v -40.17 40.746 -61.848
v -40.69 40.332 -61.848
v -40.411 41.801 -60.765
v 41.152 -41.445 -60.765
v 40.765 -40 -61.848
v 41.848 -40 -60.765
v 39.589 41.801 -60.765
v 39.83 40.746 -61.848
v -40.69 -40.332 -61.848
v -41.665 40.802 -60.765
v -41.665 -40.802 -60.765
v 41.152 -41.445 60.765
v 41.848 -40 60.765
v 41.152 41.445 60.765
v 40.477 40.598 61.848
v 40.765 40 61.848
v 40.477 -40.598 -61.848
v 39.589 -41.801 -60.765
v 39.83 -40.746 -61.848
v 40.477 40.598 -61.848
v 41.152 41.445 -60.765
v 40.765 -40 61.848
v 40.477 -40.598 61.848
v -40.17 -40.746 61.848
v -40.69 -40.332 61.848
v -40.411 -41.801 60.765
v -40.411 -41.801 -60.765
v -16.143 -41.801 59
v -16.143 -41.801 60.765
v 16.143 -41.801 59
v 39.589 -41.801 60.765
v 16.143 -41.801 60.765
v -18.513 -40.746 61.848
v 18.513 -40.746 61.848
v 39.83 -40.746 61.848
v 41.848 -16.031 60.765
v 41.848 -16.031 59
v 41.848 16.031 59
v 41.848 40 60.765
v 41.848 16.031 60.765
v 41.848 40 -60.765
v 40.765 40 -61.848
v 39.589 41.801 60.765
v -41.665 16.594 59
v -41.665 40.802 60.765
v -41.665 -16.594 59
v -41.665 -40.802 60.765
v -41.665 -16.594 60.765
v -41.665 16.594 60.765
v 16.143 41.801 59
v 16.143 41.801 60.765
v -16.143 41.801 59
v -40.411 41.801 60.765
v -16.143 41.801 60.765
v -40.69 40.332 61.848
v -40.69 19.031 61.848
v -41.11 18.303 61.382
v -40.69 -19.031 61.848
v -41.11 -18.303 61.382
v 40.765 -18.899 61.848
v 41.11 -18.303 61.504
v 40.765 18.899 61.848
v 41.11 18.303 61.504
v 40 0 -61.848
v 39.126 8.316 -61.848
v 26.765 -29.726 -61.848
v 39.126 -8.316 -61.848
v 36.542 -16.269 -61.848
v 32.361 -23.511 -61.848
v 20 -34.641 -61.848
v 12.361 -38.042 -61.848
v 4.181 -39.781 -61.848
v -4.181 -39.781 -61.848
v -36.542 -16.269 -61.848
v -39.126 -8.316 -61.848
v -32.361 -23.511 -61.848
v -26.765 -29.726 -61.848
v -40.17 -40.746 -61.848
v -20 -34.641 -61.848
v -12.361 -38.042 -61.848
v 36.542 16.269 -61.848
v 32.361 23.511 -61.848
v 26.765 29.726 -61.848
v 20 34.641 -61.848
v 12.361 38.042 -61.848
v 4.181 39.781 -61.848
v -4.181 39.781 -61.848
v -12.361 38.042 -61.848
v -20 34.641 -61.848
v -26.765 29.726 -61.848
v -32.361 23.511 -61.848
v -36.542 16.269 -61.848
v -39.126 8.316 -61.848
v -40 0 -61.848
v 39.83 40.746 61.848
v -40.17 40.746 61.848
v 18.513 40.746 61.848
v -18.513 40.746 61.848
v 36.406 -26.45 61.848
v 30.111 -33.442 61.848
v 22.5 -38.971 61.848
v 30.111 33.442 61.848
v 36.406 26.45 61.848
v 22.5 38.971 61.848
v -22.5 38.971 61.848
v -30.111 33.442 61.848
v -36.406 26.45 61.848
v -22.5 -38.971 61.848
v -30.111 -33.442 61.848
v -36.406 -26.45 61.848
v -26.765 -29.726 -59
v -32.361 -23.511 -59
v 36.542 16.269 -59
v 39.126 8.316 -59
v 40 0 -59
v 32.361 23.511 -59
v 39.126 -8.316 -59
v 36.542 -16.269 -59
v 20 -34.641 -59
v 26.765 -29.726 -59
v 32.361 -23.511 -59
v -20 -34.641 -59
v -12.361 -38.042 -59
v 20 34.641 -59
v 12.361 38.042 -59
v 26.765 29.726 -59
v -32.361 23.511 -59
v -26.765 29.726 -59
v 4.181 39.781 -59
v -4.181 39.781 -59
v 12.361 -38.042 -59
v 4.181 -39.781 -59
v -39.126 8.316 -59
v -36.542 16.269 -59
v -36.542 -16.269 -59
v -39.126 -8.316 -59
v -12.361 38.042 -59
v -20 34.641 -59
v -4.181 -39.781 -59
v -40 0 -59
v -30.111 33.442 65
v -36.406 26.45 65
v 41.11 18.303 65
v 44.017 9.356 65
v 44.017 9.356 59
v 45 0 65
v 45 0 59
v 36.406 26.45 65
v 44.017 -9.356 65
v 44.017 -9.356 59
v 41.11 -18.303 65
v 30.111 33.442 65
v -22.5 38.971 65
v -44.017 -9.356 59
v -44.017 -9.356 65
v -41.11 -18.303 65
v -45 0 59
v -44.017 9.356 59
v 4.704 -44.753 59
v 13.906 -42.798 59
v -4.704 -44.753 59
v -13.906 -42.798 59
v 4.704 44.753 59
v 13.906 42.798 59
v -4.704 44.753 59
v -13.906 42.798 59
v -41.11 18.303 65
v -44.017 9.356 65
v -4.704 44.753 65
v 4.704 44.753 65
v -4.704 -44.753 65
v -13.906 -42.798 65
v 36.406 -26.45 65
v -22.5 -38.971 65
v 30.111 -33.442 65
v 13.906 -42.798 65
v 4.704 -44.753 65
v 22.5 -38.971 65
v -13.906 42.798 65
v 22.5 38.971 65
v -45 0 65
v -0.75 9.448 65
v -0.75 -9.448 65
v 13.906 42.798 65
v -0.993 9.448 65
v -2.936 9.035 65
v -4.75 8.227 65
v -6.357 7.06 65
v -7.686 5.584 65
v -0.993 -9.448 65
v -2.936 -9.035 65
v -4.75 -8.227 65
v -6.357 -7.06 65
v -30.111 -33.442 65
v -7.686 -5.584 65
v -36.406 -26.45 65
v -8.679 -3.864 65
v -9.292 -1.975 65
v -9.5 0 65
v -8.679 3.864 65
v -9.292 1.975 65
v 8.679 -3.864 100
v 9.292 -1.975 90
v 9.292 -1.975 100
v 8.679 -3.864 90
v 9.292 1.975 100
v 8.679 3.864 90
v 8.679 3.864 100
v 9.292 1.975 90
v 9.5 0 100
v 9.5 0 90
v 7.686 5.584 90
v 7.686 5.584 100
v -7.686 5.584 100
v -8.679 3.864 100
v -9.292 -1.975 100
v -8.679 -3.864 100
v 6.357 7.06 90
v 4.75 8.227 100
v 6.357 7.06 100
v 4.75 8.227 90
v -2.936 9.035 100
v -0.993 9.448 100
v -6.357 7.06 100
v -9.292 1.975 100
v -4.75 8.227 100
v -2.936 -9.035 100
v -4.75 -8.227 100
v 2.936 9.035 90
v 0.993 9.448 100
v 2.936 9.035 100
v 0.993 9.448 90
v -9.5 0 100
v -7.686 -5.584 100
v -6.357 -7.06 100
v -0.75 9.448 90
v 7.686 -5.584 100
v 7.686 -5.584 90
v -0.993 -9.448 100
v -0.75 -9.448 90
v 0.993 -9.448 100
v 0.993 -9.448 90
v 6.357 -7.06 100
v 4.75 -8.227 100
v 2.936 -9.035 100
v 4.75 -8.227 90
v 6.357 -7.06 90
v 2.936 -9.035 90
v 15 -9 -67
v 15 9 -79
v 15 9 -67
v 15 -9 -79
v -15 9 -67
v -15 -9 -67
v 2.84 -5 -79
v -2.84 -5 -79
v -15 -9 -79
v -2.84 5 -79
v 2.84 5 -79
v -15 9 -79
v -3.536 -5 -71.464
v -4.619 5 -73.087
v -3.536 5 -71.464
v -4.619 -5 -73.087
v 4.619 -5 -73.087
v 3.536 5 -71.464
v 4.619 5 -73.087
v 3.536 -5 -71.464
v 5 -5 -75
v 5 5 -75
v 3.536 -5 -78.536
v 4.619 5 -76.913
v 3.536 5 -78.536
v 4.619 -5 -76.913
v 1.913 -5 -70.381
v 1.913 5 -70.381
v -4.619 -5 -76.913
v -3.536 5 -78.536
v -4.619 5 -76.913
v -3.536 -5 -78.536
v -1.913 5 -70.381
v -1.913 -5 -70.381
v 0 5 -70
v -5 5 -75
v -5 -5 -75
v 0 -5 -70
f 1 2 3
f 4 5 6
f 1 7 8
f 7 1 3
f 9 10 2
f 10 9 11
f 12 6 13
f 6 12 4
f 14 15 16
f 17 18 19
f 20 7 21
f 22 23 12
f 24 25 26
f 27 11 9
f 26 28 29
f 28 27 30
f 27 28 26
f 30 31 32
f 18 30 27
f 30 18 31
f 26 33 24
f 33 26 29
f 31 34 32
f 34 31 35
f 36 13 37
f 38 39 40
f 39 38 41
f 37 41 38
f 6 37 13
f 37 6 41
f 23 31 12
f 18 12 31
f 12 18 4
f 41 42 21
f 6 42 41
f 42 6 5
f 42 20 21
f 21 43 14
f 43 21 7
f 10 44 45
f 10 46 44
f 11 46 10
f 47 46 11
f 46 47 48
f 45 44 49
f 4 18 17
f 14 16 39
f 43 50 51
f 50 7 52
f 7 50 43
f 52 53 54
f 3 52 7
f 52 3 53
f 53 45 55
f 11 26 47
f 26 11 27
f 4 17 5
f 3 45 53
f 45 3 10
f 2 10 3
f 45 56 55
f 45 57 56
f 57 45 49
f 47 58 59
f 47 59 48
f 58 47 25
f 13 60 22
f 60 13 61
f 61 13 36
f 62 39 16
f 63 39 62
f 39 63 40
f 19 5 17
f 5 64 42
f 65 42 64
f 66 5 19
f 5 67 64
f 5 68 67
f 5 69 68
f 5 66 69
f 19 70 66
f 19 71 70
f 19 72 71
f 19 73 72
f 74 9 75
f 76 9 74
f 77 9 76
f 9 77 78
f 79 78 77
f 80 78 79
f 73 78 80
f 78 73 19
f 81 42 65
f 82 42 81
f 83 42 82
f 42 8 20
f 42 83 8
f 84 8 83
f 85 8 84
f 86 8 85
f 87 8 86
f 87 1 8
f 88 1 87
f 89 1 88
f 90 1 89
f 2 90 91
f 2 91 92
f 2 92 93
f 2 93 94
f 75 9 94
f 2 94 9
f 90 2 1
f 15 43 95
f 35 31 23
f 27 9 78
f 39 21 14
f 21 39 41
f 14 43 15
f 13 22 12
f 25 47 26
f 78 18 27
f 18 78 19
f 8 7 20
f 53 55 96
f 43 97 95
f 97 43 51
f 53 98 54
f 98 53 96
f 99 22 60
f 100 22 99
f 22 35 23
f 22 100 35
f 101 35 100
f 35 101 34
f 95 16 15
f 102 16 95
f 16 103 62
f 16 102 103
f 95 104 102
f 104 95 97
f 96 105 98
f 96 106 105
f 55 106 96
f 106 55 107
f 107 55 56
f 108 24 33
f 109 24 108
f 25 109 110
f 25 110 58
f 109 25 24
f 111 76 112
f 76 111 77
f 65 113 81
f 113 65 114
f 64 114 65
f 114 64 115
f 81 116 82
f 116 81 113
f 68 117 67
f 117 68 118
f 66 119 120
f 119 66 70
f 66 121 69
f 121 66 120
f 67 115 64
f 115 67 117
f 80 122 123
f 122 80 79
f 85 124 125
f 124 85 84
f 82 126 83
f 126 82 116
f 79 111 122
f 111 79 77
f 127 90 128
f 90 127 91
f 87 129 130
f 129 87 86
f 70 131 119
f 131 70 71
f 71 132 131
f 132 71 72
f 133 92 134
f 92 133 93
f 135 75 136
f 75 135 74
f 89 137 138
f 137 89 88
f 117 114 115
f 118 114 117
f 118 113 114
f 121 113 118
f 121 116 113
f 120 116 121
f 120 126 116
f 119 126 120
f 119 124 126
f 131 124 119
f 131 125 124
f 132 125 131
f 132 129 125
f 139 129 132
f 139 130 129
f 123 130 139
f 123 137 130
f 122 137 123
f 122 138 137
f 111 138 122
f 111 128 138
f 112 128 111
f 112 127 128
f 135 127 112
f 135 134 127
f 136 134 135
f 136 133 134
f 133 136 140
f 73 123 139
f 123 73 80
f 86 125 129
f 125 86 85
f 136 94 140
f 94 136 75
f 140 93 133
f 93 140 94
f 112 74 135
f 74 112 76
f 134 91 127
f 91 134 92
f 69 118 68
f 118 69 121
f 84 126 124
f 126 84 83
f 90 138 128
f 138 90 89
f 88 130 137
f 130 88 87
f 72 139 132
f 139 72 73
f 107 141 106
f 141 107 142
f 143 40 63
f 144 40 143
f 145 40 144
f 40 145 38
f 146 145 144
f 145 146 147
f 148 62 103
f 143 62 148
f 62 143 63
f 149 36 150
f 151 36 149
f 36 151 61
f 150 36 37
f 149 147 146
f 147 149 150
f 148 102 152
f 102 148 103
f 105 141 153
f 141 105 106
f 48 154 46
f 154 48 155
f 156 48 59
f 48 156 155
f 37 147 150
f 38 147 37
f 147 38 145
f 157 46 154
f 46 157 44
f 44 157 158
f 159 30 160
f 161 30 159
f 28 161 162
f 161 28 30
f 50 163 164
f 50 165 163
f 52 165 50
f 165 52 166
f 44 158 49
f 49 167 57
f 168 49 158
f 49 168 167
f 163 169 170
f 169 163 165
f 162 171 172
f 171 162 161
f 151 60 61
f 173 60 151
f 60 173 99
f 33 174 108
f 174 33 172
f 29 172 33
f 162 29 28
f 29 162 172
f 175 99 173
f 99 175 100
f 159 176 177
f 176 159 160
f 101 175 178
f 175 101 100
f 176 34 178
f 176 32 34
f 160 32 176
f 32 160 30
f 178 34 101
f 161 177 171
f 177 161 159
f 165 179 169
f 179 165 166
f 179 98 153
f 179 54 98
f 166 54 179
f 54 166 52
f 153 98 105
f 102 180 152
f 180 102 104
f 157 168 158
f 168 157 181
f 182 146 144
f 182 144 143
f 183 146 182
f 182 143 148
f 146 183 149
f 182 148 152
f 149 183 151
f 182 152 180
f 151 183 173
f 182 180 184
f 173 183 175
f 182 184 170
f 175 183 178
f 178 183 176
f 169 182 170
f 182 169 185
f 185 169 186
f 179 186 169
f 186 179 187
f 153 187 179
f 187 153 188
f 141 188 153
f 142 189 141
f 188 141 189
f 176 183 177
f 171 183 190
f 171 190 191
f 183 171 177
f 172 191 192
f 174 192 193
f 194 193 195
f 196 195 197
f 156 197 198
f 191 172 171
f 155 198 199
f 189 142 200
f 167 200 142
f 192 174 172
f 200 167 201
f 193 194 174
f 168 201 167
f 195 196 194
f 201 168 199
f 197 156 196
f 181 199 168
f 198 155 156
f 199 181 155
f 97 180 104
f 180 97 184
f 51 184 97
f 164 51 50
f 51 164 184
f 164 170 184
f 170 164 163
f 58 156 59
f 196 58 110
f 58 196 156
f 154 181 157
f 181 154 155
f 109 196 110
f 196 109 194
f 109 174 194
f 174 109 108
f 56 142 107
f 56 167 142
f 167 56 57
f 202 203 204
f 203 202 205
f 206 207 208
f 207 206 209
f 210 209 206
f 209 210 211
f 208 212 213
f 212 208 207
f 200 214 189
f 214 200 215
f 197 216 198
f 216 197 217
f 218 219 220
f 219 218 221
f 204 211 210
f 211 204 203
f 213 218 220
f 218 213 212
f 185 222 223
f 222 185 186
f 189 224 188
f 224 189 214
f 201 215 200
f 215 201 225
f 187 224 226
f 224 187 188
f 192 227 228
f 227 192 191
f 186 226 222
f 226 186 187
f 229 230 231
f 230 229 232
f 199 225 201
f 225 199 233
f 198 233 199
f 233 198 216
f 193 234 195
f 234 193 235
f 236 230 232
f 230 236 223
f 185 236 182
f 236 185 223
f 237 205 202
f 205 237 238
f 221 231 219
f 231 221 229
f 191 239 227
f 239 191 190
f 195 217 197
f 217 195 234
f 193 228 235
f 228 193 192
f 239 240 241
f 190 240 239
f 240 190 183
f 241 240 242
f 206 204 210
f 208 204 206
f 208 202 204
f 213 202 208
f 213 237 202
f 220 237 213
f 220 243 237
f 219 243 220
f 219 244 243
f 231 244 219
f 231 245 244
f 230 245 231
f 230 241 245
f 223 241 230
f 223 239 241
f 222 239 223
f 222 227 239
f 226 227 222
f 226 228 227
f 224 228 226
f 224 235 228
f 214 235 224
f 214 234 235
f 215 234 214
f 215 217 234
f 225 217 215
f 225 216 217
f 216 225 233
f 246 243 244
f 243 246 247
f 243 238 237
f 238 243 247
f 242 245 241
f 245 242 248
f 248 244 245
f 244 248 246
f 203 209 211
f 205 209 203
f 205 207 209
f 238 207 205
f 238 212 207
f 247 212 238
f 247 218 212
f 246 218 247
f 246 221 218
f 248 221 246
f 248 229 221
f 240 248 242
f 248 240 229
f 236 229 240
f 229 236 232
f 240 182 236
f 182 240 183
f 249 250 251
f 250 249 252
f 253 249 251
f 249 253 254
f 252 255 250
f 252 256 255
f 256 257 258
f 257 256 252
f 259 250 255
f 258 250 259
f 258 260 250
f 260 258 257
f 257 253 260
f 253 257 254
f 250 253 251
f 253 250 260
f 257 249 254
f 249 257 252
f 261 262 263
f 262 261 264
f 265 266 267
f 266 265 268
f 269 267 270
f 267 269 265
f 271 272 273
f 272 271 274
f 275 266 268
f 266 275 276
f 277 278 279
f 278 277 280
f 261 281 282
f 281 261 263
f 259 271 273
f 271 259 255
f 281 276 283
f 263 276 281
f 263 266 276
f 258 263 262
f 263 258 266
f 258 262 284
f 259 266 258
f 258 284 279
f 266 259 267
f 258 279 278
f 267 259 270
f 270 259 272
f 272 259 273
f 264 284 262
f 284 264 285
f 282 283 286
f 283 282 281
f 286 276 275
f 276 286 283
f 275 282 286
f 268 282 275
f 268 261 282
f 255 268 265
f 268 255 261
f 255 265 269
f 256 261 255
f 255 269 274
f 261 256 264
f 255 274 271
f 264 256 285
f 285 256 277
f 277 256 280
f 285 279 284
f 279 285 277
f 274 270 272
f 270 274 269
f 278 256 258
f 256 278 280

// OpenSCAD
// Parameters
frame_size_mm = 80; //[40:160:1]
body_length_mm = 120; //[60:240:1]
corner_radius_mm = 2; //[1:6:0.5]
flange_outer_diameter_mm = 90; //[60:140:1]
flange_thickness_mm = 6; //[3:15:0.5]
mount_hole_count = 4; //[4:4:1]
mount_hole_diameter_mm = 6.5; //[3:12:0.1]
mount_hole_pitch_mm = 70; //[40:120:1]
shaft_diameter_mm = 19; //[8:35:0.1]
shaft_length_mm = 35; //[10:80:1]
shaft_flat_depth_mm = 1.5; //[0.5:4:0.1]
shaft_flat_length_mm = 25; //[5:60:1]
shaft_center_to_face_mm = 0; //[0:10:0.5]
rear_cap_thickness_mm = 8; //[3:20:0.5]
connector_boss_width_mm = 30; //[15:60:1]
connector_boss_height_mm = 18; //[10:40:1]
connector_boss_depth_mm = 12; //[6:30:1]
connector_port_diameter_mm = 10; //[4:25:0.5]
connector_port_depth_mm = 8; //[3:25:1]
overlap_mm = 1; //[0.5:2:0.1]

// Servo Motor - complete geometry
module servo_motor() {
  color([0.15, 0.2, 0.35]) {
    // Body with rounded corners
    difference() {
      minkowski() {
        cube([frame_size_mm, frame_size_mm, body_length_mm], center=true);
        sphere(r=corner_radius_mm, center=true);
      }
      // Rear cap
      translate([0, 0, -body_length_mm/2 - rear_cap_thickness_mm/2 + overlap_mm])
        cylinder(r=frame_size_mm/2, h=rear_cap_thickness_mm, center=true);
    }
    
    // Front flange with mounting holes
    difference() {
      translate([0, 0, body_length_mm/2 + flange_thickness_mm/2 - overlap_mm])
        cylinder(r=flange_outer_diameter_mm/2, h=flange_thickness_mm, center=true);
      for (i = [0:3]) {
        rotate([0, 0, i*90])
          translate([mount_hole_pitch_mm/2, mount_hole_pitch_mm/2, 0])
            cylinder(r=mount_hole_diameter_mm/2, h=flange_thickness_mm + 2*overlap_mm, center=true);
      }
    }
    
    // Output shaft with flat
    difference() {
      translate([0, 0, body_length_mm/2 + flange_thickness_mm - overlap_mm + shaft_center_to_face_mm + shaft_length_mm/2])
        cylinder(r=shaft_diameter_mm/2, h=shaft_length_mm, center=true);
      translate([shaft_diameter_mm/2 - shaft_flat_depth_mm/2, 0, body_length_mm/2 + flange_thickness_mm - overlap_mm + shaft_center_to_face_mm + shaft_flat_length_mm/2])
        cube([shaft_diameter_mm, shaft_diameter_mm, shaft_flat_length_mm], center=true);
    }
    
    // Rear connector boss with port
    difference() {
      translate([0, 0, -body_length_mm/2 - rear_cap_thickness_mm - connector_boss_depth_mm/2 + overlap_mm])
        cube([connector_boss_width_mm, connector_boss_height_mm, connector_boss_depth_mm], center=true);
      translate([0, 0, -body_length_mm/2 - rear_cap_thickness_mm - connector_boss_depth_mm + connector_port_depth_mm/2 + overlap_mm])
        rotate([90, 0, 0])
          cylinder(r=connector_port_diameter_mm/2, h=connector_port_depth_mm + 2*overlap_mm, center=true);
    }
  }
}

// Assembly
module assembly() {
  servo_motor();
}

assembly();
